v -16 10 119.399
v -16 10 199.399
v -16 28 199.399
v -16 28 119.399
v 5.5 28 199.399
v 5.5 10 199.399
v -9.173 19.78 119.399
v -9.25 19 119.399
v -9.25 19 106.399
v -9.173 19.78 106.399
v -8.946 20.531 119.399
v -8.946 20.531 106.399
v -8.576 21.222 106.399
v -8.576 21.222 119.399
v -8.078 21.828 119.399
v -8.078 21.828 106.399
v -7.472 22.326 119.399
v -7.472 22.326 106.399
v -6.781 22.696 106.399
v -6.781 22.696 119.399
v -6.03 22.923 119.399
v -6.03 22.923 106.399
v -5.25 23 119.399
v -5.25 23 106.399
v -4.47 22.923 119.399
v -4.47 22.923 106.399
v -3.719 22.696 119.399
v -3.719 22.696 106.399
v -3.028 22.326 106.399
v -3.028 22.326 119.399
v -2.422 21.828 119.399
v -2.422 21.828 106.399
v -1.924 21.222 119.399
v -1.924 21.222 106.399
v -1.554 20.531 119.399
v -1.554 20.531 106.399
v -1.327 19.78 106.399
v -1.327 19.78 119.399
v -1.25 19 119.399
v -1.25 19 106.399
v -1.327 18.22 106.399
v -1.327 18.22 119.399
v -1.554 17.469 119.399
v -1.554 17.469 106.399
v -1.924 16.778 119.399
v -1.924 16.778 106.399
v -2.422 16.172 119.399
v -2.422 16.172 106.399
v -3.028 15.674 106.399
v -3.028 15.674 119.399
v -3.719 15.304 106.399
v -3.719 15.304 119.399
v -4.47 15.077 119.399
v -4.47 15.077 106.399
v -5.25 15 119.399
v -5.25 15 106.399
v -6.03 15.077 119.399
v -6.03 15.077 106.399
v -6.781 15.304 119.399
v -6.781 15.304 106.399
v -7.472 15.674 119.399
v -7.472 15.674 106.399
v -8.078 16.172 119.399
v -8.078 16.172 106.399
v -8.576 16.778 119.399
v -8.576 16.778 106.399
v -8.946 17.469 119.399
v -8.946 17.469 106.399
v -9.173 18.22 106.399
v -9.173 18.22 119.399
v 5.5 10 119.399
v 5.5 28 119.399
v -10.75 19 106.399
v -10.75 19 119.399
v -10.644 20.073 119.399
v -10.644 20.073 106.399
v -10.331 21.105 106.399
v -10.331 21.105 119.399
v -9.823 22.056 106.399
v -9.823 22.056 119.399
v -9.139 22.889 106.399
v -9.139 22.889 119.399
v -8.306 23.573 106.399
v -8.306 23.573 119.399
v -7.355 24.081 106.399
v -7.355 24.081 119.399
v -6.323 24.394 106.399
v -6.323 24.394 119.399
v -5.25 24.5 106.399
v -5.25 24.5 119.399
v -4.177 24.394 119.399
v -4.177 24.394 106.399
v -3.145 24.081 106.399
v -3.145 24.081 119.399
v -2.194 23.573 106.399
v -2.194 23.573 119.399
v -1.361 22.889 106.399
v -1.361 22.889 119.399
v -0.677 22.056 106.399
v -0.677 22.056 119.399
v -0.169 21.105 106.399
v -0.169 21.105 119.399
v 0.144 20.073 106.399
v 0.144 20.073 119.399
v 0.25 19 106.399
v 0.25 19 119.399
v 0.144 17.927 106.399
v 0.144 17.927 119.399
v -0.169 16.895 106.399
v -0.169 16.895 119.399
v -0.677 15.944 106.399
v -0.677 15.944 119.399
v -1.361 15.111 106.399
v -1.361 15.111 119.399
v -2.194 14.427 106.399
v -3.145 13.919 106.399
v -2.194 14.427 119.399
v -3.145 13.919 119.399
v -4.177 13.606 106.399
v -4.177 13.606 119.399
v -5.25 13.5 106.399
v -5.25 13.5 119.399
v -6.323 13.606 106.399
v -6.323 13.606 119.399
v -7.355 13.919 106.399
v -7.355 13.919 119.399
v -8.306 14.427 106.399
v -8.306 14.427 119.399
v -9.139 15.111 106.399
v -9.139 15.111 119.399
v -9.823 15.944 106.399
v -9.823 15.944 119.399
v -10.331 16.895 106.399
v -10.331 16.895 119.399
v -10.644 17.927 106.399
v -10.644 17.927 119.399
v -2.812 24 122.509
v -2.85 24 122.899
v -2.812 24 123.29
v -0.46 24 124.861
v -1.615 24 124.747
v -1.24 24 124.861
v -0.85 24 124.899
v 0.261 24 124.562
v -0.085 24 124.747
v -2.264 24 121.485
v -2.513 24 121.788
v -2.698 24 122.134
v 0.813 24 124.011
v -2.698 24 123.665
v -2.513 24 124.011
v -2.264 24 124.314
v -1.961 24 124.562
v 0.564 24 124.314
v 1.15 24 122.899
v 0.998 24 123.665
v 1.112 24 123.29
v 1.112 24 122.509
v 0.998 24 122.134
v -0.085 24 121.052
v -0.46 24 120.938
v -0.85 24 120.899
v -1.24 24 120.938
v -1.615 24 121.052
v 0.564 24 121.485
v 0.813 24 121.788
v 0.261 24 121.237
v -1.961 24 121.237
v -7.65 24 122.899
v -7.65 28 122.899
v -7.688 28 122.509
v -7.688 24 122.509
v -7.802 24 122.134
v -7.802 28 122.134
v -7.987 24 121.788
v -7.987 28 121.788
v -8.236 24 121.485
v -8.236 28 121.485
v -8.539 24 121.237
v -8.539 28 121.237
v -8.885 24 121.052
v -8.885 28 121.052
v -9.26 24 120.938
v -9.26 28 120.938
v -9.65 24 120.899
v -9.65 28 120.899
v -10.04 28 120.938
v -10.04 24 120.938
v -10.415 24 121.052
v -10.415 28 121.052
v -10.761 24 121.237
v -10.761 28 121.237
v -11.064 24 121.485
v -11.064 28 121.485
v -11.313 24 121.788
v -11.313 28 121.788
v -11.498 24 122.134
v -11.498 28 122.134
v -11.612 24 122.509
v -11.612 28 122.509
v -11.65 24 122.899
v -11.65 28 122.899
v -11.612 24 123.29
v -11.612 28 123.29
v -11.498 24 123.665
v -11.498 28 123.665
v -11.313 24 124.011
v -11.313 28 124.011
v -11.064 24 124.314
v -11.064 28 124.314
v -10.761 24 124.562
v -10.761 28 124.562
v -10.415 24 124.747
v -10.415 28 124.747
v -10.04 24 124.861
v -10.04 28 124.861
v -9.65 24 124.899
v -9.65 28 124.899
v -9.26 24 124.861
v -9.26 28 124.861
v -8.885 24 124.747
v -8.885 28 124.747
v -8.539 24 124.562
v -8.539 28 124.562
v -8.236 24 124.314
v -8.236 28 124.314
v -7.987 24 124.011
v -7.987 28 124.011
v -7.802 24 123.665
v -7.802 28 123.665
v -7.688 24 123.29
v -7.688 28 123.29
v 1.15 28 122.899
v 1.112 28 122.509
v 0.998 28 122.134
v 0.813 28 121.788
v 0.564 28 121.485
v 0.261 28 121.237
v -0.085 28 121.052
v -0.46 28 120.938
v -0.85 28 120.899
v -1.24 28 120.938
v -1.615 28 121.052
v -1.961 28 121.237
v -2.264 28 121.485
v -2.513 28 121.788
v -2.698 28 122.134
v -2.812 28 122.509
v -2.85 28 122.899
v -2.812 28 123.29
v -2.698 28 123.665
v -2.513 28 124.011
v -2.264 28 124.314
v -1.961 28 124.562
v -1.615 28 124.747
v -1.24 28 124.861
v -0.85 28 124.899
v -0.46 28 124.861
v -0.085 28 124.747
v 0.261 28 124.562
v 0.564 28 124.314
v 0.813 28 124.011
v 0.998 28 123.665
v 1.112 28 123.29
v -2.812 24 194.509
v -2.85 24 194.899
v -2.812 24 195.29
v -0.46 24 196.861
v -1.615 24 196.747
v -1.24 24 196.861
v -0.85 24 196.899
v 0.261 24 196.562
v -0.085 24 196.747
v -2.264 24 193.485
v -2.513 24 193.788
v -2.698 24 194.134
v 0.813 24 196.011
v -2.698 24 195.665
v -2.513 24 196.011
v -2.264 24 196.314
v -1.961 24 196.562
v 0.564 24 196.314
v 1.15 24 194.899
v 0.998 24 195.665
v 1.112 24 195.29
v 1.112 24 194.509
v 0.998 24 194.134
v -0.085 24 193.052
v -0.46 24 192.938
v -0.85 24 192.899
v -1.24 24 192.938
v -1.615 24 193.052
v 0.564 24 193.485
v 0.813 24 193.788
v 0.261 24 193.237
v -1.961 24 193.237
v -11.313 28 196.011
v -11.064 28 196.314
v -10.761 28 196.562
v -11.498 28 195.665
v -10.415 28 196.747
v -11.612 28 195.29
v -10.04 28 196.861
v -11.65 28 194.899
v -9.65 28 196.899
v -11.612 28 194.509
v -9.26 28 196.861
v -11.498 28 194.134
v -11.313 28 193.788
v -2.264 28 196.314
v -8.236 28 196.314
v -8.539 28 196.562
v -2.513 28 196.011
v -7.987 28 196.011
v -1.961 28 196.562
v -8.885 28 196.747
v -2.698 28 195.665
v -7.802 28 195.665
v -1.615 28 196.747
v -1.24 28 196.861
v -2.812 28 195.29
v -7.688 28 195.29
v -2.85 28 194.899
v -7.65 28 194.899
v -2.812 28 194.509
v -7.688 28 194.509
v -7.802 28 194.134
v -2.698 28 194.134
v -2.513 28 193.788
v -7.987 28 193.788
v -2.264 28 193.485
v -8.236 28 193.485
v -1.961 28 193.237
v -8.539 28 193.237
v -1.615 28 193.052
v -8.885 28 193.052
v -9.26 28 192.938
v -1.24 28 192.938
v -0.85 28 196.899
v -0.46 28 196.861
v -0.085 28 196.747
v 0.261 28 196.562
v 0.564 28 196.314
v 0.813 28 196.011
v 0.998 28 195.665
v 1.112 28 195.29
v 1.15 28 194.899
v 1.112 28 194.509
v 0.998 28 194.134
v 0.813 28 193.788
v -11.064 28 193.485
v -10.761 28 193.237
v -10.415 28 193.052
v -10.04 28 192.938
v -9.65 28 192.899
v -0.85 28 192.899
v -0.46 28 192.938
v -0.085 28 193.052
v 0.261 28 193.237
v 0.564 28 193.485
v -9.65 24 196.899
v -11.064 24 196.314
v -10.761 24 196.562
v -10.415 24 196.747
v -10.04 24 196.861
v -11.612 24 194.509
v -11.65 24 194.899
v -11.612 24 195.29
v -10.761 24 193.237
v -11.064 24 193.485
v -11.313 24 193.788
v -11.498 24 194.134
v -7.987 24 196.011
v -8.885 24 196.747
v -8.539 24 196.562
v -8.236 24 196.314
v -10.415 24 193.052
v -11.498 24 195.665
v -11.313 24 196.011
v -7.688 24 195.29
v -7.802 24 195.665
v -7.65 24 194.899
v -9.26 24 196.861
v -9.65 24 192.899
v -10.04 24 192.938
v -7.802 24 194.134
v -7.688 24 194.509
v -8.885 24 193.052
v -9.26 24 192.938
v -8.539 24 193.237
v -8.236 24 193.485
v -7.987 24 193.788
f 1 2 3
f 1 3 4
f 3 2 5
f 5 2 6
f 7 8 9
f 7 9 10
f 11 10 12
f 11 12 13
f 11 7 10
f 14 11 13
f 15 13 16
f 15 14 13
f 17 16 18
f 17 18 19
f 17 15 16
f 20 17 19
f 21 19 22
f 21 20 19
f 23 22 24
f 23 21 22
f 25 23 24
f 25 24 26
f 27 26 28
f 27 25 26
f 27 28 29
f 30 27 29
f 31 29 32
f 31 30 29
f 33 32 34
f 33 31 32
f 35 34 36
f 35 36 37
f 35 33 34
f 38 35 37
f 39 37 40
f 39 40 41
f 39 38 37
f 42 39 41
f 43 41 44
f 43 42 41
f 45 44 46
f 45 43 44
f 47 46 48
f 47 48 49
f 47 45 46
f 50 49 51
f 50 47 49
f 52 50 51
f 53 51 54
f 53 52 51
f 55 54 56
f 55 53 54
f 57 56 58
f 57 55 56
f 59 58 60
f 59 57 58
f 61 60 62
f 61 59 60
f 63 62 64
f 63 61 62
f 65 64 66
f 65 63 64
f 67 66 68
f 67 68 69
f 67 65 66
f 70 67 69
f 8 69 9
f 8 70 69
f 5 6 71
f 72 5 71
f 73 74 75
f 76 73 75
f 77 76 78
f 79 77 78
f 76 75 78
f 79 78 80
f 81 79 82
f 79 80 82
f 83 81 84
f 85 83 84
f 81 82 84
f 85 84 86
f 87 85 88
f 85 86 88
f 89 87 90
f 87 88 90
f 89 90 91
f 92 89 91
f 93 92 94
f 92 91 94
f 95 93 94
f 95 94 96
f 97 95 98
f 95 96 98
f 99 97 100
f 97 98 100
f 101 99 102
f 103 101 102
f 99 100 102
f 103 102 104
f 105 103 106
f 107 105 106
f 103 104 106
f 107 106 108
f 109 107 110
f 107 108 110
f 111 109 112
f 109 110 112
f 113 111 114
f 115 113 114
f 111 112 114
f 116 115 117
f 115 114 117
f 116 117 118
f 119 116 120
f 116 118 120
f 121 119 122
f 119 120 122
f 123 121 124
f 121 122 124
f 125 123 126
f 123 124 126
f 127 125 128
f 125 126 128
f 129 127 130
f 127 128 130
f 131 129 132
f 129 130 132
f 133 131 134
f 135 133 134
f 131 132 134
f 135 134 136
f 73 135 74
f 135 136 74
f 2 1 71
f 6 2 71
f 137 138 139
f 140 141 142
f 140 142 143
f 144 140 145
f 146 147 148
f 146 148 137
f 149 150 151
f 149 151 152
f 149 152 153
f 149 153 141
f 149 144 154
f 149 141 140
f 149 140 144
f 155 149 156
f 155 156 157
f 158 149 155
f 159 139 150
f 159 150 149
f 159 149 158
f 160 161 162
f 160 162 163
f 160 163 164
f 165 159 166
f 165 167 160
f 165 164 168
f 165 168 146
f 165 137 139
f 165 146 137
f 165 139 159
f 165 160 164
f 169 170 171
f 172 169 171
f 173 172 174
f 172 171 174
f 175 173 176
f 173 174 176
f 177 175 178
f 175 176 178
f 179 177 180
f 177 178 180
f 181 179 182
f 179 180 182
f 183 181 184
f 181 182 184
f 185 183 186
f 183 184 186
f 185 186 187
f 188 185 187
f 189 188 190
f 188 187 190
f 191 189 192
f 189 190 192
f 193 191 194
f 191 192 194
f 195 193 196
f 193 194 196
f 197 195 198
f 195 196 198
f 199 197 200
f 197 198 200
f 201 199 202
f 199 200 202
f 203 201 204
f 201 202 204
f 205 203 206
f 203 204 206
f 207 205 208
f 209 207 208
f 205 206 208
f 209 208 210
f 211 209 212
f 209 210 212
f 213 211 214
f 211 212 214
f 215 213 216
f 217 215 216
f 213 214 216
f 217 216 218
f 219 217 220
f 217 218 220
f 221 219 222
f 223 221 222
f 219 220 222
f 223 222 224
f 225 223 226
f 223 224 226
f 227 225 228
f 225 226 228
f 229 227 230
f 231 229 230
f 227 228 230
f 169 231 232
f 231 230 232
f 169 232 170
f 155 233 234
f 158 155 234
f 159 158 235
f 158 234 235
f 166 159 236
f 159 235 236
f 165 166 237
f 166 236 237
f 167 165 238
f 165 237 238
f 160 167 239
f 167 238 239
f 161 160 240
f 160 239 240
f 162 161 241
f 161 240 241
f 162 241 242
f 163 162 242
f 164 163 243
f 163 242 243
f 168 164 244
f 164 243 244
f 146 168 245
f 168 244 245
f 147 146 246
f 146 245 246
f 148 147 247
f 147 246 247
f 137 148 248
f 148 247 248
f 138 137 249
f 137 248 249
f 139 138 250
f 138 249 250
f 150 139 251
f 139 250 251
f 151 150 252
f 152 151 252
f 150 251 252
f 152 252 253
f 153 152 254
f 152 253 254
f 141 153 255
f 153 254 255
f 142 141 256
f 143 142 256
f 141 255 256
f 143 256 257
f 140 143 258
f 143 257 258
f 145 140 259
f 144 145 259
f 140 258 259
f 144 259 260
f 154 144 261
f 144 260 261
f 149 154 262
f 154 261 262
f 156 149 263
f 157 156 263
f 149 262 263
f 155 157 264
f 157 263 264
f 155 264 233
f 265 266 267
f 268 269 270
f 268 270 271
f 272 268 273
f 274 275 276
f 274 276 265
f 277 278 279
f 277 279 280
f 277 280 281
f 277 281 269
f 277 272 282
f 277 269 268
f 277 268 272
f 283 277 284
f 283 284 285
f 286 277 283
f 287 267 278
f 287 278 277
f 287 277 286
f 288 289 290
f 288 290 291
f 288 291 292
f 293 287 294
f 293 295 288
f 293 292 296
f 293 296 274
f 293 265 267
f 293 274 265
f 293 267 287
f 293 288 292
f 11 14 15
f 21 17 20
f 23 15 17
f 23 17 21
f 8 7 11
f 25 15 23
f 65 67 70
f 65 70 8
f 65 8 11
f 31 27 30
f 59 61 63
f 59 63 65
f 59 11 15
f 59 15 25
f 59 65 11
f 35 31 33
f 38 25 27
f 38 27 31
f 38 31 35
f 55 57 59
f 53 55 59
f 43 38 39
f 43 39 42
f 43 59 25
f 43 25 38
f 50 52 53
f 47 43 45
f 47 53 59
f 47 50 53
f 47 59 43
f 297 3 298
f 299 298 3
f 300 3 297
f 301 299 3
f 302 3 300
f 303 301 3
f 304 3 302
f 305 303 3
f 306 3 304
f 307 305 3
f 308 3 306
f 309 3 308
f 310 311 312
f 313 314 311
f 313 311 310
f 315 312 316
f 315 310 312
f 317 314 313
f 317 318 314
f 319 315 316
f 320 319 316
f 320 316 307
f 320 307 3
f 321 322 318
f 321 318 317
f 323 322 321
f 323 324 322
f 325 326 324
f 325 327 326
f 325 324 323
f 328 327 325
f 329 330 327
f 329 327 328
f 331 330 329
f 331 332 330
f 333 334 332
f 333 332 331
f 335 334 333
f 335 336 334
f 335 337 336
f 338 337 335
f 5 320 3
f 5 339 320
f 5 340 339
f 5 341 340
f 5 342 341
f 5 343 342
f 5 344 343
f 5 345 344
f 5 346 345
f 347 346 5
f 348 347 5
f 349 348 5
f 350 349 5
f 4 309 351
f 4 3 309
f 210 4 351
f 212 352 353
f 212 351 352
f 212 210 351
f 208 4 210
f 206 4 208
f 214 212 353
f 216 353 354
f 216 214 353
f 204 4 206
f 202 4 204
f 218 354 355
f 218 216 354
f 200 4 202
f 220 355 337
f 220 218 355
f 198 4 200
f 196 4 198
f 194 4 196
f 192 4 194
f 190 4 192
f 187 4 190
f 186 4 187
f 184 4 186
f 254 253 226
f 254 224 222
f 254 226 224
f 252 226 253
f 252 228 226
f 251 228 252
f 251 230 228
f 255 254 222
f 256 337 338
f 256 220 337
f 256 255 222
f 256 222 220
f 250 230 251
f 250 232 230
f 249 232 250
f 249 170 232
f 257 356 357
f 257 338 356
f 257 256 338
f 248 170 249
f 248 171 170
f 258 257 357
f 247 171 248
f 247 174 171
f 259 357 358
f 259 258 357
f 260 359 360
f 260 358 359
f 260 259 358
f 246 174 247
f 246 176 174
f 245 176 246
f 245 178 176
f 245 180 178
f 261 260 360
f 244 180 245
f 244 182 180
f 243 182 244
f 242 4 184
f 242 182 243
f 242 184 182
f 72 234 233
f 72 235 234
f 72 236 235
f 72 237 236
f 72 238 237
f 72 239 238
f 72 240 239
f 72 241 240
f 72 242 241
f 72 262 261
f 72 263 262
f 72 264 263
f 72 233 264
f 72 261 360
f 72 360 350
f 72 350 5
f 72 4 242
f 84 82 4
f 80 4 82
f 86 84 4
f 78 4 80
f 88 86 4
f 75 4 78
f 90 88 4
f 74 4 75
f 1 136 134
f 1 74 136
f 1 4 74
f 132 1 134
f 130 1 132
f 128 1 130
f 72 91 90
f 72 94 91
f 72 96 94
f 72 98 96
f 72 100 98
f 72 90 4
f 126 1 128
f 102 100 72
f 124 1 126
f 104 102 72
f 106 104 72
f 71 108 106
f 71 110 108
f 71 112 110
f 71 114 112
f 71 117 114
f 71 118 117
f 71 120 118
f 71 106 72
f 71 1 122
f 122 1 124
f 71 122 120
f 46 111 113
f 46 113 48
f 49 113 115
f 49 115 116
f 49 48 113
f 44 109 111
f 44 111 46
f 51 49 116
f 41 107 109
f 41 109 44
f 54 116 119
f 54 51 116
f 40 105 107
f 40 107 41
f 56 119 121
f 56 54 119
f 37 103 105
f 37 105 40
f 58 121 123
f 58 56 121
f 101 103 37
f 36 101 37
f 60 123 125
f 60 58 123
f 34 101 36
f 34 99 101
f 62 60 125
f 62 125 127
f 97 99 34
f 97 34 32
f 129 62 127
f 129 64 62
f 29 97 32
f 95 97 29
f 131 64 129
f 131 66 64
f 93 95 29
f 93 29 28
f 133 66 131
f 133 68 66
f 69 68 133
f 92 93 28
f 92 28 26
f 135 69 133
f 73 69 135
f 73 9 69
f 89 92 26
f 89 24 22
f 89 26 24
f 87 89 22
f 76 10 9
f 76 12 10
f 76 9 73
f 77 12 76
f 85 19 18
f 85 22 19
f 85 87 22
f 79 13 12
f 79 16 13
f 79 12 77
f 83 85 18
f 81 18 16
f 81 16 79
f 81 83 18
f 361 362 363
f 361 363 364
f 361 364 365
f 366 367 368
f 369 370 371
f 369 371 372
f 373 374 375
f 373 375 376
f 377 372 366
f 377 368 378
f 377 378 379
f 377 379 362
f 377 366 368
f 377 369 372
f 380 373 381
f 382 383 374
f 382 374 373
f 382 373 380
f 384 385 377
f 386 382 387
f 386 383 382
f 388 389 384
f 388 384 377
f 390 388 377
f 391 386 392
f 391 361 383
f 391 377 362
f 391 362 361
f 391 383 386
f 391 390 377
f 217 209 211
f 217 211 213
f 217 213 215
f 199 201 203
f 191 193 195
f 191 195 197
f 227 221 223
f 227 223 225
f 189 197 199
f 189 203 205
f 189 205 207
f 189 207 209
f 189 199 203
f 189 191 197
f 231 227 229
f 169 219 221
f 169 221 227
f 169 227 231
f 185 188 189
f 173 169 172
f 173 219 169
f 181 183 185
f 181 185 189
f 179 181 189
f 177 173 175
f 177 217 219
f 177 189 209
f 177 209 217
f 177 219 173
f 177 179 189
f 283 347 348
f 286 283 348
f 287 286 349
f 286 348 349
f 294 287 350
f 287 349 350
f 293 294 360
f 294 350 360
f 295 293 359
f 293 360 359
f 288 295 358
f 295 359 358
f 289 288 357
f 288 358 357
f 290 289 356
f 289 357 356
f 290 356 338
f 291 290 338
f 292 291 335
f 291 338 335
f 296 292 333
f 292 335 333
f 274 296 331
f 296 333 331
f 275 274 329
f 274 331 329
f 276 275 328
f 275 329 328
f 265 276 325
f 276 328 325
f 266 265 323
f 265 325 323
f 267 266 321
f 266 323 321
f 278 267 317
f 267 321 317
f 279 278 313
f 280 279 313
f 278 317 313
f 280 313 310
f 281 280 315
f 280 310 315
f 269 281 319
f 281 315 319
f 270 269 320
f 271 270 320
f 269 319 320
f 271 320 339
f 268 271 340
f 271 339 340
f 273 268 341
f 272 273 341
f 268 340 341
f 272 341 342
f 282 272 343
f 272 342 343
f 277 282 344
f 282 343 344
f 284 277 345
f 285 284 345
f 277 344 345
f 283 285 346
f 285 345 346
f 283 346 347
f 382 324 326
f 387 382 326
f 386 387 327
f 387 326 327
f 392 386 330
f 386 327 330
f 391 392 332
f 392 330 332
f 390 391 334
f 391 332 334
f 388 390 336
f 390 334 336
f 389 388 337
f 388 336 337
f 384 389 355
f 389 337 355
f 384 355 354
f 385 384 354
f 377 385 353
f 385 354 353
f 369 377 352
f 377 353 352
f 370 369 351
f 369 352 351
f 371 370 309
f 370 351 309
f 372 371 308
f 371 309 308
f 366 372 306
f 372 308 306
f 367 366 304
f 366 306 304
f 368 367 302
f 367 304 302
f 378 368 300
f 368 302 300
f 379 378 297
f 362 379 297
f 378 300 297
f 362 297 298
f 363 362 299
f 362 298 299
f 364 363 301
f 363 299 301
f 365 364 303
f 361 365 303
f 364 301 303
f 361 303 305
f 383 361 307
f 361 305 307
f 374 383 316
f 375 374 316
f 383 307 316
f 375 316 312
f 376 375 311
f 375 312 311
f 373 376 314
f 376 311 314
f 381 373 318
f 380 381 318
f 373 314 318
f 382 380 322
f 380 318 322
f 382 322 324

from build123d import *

# Parameters (mm, degrees)
BOSS_EXTRUDE6_START = 10
SKETCH22_W          = 21.5
SKETCH22_H          = 80
BOSS_EXTRUDE6_DEPTH = 18
SKETCH23_R          = 2
CUT_EXTRUDE9_DEPTH  = 4
SKETCH24_R          = 5.5
SKETCH24_R_2        = 4
BOSS_EXTRUDE7_DEPTH = 13


with BuildPart() as part:
    # Sketch22 → Boss-Extrude6 (new body)
    with BuildSketch(Plane(origin=(0, 0, 0), x_dir=(1, 0, 0), z_dir=(0, 1, 0)).offset(BOSS_EXTRUDE6_START)):
        with Locations((-5.25, -159.399454256)):
            Rectangle(SKETCH22_W, SKETCH22_H)
    extrude(amount=BOSS_EXTRUDE6_DEPTH)

    # Sketch23 → Cut-Extrude9 (cut)
    with BuildSketch(Plane(origin=(0, 28, 0), x_dir=(1, 0, 0), z_dir=(0, 1, 0))):
        with Locations((-9.65, -122.899454256)):
            Circle(SKETCH23_R)
        with Locations((-0.85, -122.899454256)):
            Circle(SKETCH23_R)
        with Locations((-0.85, -194.899454256)):
            Circle(SKETCH23_R)
        with Locations((-9.65, -194.899454256)):
            Circle(SKETCH23_R)
    extrude(amount=-CUT_EXTRUDE9_DEPTH, mode=Mode.SUBTRACT)

    # Sketch24 → Boss-Extrude7 (add)
    with BuildSketch(Plane(origin=(0, 0, 119.399454256), x_dir=(-1, 0, 0), z_dir=(0, 0, -1))):
        with Locations((5.25, 19)):
            Circle(SKETCH24_R)
        with Locations((5.25, 19)):
            Circle(SKETCH24_R_2, mode=Mode.SUBTRACT)
    extrude(amount=BOSS_EXTRUDE7_DEPTH)


solid = part.part
